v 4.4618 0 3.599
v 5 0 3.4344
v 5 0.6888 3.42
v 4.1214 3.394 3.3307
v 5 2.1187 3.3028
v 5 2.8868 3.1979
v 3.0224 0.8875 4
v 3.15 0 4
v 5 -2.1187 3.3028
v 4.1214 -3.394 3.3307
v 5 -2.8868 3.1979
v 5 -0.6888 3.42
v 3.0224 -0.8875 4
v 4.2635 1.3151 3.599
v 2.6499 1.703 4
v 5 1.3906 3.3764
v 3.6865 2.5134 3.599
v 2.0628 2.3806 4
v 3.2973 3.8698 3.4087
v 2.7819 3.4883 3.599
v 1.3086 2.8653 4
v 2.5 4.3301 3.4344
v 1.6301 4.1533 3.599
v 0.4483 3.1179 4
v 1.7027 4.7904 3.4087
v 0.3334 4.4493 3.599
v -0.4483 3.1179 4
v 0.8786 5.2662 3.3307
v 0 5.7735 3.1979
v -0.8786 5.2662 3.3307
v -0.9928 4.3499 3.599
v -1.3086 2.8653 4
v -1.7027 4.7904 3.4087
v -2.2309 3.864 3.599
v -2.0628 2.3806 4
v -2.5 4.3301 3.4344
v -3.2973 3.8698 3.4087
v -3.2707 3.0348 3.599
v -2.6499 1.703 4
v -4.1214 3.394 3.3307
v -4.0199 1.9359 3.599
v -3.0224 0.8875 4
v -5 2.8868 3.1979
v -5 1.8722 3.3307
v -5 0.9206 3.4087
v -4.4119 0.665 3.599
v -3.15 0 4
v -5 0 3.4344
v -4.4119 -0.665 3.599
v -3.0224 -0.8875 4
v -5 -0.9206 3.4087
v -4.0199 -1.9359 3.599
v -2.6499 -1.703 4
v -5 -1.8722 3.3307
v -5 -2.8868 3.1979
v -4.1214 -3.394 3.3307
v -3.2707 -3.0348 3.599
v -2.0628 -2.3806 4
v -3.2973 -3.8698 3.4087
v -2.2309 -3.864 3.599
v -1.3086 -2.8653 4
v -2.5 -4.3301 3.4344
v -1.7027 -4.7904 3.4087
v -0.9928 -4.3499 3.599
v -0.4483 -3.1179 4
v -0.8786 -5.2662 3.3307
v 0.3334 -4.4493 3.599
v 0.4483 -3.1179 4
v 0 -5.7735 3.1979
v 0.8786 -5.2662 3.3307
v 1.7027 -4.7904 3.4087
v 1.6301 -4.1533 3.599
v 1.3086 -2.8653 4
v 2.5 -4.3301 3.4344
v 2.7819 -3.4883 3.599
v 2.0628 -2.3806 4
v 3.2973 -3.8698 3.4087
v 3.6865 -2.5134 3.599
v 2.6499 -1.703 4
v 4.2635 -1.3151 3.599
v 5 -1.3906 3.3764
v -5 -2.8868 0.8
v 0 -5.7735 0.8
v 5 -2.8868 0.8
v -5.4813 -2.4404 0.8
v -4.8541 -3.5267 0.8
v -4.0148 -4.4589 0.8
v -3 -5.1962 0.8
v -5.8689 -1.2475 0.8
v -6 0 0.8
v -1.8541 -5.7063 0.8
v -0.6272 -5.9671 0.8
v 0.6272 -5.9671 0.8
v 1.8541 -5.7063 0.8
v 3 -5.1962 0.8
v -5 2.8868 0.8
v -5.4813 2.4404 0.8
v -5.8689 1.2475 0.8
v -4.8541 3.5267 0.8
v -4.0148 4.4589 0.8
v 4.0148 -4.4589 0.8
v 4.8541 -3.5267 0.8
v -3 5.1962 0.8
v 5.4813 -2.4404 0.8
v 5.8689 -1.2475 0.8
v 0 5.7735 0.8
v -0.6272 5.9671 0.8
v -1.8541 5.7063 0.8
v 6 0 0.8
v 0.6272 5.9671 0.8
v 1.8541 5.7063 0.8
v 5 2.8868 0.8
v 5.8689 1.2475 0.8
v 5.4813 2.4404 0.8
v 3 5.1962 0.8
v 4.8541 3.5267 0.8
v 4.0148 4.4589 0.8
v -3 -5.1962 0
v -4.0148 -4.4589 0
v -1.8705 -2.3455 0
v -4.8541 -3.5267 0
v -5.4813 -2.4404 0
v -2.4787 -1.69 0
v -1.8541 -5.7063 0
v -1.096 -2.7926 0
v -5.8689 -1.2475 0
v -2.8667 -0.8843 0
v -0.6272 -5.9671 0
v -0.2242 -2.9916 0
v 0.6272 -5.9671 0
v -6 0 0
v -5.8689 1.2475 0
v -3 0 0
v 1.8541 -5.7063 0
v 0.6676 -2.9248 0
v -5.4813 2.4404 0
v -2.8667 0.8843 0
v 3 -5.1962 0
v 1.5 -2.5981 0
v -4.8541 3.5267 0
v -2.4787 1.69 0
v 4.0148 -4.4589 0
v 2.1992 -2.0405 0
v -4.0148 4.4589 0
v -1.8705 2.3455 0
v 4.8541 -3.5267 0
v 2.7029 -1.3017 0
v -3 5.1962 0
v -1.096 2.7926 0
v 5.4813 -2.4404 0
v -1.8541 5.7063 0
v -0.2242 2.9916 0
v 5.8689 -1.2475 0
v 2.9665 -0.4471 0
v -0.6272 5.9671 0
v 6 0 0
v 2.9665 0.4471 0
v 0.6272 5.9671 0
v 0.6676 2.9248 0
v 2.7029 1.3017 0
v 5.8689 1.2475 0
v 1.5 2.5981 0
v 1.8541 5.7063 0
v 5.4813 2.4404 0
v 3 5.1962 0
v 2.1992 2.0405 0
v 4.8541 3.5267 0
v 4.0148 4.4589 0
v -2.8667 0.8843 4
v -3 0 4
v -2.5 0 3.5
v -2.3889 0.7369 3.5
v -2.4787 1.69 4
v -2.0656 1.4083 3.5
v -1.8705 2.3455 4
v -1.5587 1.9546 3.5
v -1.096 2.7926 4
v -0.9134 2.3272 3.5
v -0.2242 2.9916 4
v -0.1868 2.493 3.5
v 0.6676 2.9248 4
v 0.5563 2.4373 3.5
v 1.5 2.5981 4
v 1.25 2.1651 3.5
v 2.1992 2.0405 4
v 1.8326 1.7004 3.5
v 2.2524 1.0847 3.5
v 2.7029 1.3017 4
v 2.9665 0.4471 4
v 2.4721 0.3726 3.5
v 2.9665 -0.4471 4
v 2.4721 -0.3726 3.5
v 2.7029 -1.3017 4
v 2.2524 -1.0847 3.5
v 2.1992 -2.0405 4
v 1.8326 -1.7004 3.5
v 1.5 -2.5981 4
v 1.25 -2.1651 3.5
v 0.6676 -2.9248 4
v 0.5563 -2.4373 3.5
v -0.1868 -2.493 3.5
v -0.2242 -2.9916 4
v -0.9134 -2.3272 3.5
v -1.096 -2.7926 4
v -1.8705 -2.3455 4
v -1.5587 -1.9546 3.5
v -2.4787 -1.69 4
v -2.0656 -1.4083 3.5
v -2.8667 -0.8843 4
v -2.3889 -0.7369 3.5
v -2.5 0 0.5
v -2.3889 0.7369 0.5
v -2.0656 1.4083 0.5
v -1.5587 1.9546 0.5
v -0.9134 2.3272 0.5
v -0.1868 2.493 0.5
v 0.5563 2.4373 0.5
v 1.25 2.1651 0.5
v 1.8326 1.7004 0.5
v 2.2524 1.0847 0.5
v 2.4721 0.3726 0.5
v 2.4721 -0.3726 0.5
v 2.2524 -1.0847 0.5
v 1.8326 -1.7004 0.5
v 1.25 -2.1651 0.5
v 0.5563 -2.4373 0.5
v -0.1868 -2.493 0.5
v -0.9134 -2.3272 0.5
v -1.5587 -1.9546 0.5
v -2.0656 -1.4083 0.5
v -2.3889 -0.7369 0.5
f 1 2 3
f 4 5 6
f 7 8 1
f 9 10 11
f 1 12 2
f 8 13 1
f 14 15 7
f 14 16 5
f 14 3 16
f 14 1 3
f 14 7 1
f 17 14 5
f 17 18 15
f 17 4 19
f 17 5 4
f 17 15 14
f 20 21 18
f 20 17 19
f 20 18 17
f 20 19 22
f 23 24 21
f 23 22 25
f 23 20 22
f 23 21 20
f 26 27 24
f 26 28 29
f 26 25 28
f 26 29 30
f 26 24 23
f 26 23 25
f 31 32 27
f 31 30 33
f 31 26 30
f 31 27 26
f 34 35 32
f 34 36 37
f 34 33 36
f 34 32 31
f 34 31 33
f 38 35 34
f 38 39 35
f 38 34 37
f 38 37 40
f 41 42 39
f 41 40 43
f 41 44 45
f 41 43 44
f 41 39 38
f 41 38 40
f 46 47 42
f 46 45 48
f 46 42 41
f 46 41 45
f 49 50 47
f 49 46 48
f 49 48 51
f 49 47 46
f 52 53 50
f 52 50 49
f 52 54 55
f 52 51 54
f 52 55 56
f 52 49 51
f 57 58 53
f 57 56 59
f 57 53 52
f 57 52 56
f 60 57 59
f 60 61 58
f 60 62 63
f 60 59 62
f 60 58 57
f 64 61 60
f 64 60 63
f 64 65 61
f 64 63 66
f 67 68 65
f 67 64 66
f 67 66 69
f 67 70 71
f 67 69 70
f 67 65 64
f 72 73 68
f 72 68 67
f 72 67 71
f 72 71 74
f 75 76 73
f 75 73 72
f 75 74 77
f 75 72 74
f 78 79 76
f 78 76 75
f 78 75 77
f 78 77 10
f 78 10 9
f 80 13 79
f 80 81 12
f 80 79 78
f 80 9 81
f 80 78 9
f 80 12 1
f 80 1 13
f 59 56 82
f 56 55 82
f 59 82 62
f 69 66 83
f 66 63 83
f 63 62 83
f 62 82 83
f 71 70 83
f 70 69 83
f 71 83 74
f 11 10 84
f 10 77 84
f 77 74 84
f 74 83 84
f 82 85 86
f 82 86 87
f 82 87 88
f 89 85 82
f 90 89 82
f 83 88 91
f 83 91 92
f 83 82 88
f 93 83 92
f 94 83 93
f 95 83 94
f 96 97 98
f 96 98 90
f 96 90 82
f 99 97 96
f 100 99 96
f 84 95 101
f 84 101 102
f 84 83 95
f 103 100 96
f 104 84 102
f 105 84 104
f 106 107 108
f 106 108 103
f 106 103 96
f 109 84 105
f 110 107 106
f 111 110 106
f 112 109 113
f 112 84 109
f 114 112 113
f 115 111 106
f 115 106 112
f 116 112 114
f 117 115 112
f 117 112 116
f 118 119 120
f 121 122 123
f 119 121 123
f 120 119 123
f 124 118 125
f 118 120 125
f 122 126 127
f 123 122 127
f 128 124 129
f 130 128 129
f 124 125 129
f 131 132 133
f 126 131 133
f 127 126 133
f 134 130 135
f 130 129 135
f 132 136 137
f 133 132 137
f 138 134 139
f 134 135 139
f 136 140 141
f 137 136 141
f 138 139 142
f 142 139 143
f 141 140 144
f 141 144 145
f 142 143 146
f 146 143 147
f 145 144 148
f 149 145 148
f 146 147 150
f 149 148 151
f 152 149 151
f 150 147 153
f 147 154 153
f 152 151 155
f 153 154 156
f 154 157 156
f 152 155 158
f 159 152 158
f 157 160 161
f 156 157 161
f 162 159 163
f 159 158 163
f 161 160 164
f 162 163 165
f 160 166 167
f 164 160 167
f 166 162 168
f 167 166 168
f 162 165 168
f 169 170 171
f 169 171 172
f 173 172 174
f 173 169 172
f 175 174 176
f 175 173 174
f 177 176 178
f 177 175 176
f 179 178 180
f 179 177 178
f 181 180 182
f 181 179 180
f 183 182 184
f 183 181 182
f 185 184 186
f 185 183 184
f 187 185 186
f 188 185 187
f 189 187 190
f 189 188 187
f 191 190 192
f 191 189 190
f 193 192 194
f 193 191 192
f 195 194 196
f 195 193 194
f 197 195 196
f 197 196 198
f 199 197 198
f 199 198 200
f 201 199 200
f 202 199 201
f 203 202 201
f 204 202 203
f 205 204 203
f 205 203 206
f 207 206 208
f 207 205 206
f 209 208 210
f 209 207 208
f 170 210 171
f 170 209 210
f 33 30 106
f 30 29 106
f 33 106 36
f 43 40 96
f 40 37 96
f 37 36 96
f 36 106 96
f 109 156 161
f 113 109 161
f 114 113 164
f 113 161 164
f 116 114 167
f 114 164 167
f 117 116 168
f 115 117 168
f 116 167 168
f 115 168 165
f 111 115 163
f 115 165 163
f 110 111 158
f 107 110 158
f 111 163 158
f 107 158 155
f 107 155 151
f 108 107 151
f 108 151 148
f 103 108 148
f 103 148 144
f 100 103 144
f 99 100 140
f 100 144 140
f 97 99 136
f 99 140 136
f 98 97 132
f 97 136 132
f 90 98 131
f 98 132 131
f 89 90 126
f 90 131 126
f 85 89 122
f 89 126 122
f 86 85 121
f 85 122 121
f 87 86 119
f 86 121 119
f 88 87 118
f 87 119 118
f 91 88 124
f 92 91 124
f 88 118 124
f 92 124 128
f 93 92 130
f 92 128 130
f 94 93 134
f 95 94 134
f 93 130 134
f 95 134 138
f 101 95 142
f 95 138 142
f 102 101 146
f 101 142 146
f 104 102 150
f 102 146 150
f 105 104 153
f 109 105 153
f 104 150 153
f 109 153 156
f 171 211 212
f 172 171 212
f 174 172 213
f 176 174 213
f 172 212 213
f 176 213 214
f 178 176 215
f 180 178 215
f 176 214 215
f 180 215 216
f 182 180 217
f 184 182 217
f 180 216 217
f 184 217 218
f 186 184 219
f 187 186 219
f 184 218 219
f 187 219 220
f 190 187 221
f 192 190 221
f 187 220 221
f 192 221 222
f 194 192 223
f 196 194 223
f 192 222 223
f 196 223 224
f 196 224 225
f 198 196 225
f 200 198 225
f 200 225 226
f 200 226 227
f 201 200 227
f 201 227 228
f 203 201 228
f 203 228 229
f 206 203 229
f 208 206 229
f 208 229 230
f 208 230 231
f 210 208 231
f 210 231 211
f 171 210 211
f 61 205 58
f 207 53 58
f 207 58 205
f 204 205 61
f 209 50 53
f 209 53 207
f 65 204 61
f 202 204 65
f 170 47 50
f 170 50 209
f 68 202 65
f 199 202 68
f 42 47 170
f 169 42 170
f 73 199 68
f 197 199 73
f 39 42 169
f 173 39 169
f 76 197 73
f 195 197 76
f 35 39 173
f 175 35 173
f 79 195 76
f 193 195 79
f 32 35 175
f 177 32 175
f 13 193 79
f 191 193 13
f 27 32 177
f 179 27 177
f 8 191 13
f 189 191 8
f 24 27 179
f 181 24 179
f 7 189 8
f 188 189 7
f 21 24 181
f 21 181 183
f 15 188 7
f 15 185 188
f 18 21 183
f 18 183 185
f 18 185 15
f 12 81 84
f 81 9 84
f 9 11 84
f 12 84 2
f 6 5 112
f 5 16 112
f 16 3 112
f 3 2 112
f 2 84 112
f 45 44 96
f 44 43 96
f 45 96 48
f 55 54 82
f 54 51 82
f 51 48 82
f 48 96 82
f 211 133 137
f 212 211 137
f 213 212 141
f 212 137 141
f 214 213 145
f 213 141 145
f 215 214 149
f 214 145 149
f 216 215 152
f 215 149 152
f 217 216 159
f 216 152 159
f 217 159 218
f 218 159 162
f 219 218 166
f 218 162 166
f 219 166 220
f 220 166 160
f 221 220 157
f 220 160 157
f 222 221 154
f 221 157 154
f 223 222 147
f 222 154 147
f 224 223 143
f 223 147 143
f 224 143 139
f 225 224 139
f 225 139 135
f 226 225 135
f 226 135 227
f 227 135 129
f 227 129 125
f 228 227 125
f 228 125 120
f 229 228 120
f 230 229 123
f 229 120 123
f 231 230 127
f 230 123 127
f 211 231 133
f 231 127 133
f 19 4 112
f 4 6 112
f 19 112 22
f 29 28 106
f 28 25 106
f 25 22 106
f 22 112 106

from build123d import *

# Parameters (mm, degrees)
SKETCH_1_R          = 6
EXTRUDE_1_DEPTH     = 0.8
EXTRUDE_2_DEPTH     = 3.2
SKETCH_3_OUTSIDE_W  = 38.42
SKETCH_3_OUTSIDE_H  = 38.42
SKETCH_3_OUTSIDE_R  = 3.15
CUT_EXTRUDE_1_DEPTH = 3.2
CUT_EXTRUDE_1_DRAFT = -73
HOLE_WIZARD_M61_D   = 5
CHAMFER_1_SIZE      = 0.5
CHAMFER_2_SIZE      = 0.5


with BuildPart() as part:
    # Эскиз1 → Бобышка-Вытянуть1 (new body)
    with BuildSketch(Plane.XY):
        Circle(SKETCH_1_R)
    extrude(amount=EXTRUDE_1_DEPTH)

    # Эскиз2 → Бобышка-Вытянуть2 (add)
    with BuildSketch(Plane.XY.offset(0.8)):
        Polygon((0, 5.773502692), (-5, 2.886751346), (-5, -2.886751346), (0, -5.773502692), (5, -2.886751346), (5, 2.886751346), align=None)
    extrude(amount=EXTRUDE_2_DEPTH)


with BuildPart() as cut_extrude_1_tool:
    # Эскиз3 outside → Вырез-Вытянуть1 (with draft: the straight prism first)
    with BuildSketch(Plane.XY.offset(4)):
        Rectangle(SKETCH_3_OUTSIDE_W, SKETCH_3_OUTSIDE_H)
        Circle(SKETCH_3_OUTSIDE_R, mode=Mode.SUBTRACT)
    extrude(amount=-CUT_EXTRUDE_1_DEPTH)
    # Вырез-Вытянуть1: the draft: its side faces are tilted about the plane it starts from
    cut_extrude_1_sides = [cut_extrude_1_tool.faces().sort_by_distance(p)[0] for p in [
        (0, -19.21, 2.4),
        (19.21, 0, 2.4),
        (0, 19.21, 2.4),
        (-19.21, 0, 2.4),
        (-3.15, 0, 2.4),
    ]]
    draft(cut_extrude_1_sides, Plane.XY.offset(4), CUT_EXTRUDE_1_DRAFT)


with BuildPart() as part_1:
    add(part.part)

    # Вырез-Вытянуть1: cut by cut_extrude_1_tool
    add(cut_extrude_1_tool.part, mode=Mode.SUBTRACT)

    # Отверстие обработанное метчиком M61 (through all)
    with Locations(Plane.XY.offset(4)):
        with Locations((0, 0)):
            Hole(HOLE_WIZARD_M61_D / 2)

    # Фаска1
    chamfer_1_edges = [part_1.edges().sort_by_distance(p)[0] for p in [
        (2.5, 0, 4),
    ]]
    chamfer(chamfer_1_edges, length=CHAMFER_1_SIZE)

    # Фаска2
    chamfer_2_edges = [part_1.edges().sort_by_distance(p)[0] for p in [
        (2.5, 0, 0),
    ]]
    chamfer(chamfer_2_edges, length=CHAMFER_2_SIZE)


solid = part_1.part
